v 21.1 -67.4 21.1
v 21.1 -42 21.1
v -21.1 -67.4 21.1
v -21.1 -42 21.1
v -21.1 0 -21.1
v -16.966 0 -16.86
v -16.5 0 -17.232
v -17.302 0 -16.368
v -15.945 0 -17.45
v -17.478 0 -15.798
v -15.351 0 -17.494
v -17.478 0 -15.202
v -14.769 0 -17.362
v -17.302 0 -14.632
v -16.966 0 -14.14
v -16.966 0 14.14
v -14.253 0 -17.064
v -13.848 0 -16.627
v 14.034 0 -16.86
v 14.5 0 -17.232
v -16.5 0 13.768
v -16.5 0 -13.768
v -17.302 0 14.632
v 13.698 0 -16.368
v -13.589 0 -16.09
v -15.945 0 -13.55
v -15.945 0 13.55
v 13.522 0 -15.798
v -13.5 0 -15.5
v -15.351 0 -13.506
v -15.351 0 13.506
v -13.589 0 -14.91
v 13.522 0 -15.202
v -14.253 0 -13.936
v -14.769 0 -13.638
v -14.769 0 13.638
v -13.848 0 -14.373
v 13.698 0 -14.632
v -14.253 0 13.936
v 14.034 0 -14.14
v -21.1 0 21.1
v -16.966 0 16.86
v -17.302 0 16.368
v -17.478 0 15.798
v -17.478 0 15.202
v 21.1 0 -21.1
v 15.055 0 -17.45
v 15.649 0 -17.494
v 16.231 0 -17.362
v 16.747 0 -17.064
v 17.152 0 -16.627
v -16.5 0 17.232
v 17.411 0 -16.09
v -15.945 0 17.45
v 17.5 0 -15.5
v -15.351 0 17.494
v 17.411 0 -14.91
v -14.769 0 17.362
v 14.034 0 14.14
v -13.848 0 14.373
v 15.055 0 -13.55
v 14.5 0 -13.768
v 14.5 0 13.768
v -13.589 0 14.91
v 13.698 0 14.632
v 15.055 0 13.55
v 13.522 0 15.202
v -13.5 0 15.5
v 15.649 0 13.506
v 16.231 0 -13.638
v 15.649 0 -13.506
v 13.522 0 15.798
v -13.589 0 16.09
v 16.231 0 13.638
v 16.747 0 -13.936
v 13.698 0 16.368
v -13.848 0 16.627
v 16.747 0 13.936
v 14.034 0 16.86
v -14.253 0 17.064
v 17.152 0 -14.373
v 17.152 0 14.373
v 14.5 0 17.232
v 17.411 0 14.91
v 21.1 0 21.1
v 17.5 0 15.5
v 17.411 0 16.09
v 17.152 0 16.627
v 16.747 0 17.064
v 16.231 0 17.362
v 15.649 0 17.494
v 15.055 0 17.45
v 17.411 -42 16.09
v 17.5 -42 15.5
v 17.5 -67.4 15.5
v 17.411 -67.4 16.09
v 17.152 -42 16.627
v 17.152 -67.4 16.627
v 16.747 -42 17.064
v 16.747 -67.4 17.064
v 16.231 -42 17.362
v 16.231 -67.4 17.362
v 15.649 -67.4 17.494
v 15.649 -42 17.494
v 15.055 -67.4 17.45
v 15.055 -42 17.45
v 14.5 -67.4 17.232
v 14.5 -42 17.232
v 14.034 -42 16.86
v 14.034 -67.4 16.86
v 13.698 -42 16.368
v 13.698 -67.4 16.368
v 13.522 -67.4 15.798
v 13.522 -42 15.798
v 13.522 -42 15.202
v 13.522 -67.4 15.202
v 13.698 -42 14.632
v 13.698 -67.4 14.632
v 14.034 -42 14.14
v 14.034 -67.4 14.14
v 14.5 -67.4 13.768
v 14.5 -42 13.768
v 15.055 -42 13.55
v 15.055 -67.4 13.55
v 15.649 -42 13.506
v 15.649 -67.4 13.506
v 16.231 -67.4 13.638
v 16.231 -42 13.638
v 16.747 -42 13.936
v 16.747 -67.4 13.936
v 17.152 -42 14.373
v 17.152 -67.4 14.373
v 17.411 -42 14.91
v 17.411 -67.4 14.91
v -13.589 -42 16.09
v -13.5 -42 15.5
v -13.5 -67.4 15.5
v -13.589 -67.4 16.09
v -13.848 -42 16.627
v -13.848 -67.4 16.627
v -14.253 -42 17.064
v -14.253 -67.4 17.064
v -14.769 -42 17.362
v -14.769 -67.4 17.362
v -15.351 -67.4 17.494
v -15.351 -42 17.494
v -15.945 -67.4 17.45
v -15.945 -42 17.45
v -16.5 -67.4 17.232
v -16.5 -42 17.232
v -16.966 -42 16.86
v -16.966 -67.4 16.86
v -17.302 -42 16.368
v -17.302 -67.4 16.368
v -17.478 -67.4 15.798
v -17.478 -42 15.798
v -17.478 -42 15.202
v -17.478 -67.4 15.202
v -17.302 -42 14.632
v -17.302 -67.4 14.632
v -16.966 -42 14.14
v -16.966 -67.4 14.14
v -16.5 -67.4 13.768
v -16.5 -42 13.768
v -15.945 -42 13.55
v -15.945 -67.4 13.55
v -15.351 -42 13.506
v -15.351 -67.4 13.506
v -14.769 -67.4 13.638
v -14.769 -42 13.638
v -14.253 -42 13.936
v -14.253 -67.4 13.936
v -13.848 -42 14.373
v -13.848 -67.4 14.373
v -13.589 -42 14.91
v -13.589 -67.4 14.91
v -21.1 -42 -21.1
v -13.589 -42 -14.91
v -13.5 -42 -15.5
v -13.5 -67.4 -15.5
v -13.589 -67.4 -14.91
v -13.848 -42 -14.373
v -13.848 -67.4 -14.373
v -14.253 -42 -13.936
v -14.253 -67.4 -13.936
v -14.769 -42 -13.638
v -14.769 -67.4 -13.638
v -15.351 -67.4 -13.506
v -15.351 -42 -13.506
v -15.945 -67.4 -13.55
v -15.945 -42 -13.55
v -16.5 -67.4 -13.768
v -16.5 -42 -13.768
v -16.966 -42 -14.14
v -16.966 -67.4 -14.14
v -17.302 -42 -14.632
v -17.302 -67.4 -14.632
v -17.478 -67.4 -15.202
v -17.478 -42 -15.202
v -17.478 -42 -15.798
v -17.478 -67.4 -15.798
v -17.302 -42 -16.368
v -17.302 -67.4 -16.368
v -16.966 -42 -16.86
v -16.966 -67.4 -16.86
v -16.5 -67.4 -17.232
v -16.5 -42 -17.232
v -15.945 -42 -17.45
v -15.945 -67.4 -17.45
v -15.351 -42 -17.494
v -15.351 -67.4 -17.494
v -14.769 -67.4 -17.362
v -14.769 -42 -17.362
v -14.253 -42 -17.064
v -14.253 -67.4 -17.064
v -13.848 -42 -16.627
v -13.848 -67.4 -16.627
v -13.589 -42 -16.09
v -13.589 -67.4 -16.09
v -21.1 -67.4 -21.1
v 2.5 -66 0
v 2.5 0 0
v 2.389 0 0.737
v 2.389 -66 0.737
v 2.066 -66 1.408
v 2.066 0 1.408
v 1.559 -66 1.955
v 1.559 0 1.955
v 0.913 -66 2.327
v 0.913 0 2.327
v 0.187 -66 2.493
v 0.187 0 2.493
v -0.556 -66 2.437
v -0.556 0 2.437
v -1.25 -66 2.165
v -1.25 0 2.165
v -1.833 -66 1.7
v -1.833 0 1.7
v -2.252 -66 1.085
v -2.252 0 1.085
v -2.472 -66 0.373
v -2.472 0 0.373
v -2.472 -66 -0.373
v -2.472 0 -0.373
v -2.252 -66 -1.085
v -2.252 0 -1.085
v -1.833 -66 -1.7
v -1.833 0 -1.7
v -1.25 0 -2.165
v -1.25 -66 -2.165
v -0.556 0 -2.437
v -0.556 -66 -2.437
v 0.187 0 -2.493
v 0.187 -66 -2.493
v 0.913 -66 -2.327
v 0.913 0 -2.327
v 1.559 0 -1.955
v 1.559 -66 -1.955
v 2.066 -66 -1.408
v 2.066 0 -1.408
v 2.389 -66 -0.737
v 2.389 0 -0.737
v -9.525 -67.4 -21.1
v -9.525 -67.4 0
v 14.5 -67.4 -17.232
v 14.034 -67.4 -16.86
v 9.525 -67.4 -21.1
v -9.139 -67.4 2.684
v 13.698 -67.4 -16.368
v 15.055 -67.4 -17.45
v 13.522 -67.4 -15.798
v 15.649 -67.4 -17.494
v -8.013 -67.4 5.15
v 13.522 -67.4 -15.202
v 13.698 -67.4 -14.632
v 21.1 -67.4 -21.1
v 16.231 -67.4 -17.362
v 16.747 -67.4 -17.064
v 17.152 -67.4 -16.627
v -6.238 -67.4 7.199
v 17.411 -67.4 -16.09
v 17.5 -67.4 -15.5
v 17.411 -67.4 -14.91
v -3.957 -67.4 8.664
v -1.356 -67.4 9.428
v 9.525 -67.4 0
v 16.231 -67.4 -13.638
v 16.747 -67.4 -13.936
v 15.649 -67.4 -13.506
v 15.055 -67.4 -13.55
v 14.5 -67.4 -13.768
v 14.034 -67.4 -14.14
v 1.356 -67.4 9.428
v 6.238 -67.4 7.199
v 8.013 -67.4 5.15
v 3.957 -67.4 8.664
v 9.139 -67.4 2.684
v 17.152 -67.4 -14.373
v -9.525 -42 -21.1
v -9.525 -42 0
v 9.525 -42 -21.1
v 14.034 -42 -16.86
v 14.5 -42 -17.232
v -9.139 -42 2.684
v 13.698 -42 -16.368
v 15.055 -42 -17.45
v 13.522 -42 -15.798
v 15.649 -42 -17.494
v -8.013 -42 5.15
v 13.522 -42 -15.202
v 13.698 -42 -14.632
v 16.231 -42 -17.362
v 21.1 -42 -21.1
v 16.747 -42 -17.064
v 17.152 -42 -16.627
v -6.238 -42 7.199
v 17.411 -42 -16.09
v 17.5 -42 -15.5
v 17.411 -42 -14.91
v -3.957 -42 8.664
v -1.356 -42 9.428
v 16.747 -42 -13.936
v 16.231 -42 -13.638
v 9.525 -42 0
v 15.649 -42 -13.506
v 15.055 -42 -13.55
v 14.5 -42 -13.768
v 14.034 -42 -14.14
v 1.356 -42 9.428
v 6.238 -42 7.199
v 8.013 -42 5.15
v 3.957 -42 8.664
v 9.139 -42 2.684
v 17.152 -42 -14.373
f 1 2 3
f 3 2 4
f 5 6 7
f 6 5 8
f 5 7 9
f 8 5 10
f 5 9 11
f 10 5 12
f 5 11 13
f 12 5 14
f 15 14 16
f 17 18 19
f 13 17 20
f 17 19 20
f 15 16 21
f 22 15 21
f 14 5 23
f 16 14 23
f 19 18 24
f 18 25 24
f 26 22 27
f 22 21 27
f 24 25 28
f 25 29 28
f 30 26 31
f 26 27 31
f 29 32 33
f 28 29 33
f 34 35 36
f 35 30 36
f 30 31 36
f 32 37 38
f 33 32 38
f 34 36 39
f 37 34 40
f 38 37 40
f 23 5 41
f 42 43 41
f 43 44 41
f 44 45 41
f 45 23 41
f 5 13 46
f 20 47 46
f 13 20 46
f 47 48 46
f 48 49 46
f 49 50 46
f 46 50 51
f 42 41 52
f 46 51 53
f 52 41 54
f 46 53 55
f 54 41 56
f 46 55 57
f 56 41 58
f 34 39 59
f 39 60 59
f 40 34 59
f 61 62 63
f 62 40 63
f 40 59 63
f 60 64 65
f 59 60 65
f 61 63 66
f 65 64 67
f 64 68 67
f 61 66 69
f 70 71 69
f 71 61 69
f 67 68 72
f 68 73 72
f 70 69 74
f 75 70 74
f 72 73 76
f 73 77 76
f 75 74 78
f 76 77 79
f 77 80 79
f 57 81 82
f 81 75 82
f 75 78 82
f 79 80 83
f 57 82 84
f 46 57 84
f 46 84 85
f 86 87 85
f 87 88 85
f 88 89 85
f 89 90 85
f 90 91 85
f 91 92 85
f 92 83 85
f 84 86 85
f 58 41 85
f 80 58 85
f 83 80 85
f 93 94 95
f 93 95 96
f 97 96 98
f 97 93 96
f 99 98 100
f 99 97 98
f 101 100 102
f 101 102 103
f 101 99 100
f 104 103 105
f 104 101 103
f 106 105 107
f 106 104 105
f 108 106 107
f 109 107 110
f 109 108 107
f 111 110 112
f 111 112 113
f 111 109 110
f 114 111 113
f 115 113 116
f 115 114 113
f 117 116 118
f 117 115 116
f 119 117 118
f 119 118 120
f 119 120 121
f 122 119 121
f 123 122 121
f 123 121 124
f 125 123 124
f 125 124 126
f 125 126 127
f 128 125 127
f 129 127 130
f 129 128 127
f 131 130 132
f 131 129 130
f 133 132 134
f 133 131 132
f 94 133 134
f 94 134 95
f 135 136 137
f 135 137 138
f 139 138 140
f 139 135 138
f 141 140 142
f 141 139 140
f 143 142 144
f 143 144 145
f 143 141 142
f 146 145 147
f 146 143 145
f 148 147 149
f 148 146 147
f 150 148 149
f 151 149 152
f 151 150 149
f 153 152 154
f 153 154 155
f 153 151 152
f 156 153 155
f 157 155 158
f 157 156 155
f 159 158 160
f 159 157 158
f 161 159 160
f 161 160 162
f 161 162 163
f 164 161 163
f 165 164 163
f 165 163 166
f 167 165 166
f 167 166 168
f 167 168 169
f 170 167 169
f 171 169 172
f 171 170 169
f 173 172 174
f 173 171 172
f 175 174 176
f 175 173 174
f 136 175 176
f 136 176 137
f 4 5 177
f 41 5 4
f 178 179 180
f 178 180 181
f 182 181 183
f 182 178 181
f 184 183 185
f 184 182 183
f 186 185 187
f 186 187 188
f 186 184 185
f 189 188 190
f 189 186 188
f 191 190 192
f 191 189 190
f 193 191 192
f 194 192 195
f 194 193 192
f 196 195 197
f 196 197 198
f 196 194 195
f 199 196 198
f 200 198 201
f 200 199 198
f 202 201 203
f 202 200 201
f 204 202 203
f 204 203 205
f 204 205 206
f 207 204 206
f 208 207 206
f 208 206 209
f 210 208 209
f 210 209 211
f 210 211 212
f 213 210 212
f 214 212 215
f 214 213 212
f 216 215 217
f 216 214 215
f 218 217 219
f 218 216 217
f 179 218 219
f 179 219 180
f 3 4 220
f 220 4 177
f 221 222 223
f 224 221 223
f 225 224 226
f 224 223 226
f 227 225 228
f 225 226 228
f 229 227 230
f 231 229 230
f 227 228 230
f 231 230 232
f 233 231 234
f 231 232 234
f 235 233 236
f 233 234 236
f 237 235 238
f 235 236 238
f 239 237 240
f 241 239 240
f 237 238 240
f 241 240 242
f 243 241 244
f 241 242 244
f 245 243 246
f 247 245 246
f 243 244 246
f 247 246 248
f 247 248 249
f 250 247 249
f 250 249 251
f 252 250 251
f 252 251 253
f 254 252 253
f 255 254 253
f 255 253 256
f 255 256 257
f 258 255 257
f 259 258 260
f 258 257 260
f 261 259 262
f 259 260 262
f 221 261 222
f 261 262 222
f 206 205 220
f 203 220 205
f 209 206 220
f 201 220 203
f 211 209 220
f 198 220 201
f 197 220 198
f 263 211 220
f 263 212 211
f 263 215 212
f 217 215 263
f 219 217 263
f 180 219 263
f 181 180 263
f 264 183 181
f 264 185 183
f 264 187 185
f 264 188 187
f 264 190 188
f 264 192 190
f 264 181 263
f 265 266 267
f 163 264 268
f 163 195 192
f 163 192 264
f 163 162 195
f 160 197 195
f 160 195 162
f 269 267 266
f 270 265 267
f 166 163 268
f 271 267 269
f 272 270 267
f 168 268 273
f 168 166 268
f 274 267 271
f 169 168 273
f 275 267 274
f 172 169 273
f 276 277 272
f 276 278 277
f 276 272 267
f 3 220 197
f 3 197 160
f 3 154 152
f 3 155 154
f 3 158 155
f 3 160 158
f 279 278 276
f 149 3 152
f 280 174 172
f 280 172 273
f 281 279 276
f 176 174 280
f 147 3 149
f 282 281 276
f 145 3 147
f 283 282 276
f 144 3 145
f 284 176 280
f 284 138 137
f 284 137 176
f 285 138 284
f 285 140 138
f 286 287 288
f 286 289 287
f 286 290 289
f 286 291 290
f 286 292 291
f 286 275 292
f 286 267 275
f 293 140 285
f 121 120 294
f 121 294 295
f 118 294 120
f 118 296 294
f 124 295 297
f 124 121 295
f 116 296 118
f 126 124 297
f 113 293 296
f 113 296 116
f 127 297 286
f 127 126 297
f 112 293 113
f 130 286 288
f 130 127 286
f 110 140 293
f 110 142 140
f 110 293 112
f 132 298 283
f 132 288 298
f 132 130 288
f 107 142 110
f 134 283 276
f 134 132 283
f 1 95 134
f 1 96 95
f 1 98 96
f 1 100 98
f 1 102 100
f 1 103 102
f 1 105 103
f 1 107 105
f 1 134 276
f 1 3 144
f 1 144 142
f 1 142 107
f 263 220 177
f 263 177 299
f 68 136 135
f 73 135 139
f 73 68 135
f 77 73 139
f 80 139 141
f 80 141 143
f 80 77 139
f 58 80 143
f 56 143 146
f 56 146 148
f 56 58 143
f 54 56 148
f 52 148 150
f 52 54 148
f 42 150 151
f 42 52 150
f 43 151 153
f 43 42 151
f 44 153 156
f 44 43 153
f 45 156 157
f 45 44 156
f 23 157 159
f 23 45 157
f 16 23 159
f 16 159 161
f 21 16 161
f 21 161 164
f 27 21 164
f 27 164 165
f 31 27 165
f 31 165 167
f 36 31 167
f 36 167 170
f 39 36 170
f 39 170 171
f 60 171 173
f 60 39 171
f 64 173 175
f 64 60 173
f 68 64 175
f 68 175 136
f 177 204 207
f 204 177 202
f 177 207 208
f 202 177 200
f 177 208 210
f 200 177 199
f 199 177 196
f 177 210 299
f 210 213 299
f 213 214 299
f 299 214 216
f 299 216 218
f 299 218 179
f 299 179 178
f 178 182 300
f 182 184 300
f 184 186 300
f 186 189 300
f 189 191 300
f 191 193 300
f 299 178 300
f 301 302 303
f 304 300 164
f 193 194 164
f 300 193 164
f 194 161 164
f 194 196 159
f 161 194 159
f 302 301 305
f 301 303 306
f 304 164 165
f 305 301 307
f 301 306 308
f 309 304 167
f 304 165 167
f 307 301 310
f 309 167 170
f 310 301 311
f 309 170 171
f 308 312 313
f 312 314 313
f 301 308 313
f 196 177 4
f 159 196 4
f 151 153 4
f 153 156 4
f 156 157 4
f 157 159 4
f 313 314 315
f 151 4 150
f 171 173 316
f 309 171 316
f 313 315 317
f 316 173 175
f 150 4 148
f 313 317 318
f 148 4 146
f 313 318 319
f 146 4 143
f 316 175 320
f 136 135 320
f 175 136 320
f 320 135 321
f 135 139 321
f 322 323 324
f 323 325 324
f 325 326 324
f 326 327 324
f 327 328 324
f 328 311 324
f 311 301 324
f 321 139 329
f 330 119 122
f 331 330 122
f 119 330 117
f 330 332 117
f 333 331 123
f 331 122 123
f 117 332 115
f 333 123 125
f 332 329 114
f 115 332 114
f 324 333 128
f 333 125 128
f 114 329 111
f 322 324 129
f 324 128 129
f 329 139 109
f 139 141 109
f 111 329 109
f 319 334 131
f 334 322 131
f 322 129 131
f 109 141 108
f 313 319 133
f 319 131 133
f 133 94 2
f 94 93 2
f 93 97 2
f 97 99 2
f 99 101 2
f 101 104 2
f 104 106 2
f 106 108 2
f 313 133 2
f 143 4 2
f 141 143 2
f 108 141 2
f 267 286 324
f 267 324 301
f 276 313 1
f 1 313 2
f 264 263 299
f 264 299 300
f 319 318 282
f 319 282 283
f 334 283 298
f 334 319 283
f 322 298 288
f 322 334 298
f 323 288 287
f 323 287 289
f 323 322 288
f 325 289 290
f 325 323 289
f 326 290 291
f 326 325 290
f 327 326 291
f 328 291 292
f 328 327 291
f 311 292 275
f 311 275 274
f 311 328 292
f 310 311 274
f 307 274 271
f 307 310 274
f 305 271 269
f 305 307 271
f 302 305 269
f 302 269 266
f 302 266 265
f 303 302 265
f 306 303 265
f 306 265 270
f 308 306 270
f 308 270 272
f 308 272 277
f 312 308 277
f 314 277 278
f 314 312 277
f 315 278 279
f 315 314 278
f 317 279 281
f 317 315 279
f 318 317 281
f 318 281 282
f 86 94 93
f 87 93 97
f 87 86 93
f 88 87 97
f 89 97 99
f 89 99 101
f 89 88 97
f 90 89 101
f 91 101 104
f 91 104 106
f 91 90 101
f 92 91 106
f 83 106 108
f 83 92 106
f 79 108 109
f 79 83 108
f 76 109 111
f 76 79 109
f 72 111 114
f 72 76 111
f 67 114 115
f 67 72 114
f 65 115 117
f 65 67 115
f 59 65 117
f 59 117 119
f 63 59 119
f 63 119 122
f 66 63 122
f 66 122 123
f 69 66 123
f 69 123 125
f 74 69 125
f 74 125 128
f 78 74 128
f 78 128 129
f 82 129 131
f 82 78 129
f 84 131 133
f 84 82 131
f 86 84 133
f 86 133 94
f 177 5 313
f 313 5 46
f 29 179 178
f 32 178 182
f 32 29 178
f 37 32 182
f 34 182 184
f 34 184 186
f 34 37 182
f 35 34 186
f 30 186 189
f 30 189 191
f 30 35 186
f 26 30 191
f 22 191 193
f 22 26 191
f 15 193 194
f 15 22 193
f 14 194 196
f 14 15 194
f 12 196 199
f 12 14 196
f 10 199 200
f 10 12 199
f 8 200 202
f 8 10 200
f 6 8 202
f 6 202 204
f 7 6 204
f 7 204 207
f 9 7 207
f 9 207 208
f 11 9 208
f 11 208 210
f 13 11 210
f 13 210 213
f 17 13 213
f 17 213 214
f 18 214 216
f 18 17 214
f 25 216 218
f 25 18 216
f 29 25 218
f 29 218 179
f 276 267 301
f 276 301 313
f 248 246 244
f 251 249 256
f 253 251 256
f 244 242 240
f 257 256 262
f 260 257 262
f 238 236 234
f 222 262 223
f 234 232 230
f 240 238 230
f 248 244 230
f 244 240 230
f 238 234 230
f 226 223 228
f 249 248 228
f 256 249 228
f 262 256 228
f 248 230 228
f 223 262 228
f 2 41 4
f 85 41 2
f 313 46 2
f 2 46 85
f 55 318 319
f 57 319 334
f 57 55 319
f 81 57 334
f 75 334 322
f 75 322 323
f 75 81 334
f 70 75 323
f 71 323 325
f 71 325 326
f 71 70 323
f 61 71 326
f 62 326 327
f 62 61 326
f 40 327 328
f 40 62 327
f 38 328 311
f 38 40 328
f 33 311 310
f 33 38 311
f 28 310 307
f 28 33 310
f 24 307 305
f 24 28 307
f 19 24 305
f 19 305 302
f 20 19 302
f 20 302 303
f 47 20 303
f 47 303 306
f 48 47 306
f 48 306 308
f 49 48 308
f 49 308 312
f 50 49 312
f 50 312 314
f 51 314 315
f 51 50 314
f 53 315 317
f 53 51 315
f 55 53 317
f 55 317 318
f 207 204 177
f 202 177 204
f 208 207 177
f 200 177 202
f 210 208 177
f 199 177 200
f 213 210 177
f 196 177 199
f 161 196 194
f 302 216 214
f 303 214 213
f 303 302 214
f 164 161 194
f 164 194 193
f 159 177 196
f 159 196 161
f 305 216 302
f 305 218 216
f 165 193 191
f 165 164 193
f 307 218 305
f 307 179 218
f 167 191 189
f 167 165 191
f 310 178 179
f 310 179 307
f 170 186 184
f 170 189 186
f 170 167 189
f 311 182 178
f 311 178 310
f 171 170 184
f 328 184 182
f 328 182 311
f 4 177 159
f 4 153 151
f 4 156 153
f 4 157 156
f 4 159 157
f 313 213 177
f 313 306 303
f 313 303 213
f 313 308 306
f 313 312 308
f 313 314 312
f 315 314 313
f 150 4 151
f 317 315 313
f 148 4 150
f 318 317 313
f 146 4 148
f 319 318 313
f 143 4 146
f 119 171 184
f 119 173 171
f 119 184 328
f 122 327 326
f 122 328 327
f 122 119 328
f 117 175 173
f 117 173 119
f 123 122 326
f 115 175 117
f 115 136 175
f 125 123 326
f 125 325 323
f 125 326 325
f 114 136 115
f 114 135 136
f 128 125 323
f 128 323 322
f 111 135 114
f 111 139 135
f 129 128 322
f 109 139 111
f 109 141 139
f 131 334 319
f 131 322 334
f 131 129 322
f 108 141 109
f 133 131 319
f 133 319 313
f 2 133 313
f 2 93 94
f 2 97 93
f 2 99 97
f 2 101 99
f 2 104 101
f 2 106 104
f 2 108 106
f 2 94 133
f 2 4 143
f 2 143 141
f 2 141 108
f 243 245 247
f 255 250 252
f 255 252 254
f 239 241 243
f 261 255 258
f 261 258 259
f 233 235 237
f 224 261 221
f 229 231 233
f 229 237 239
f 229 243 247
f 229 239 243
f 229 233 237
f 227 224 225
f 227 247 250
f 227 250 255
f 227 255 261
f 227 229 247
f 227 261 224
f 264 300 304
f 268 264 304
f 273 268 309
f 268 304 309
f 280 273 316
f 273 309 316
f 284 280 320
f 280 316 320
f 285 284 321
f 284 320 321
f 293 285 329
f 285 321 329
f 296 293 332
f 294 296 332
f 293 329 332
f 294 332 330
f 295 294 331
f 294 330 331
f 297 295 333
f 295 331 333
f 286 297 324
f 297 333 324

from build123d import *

# Parameters (mm, degrees)
F0_W     = 42.2
F0_H     = 42.2
F0_R     = 2
F0_R_2   = 2.5
F1_DEPTH = 42
F2_DEPTH = 66
F3_R     = 2
F4_DEPTH = 25.4


with BuildPart() as f1:
    # F0 (on Front) → F1 (new body)
    with BuildSketch(Plane.XZ):
        Rectangle(F0_W, F0_H)
        with Locations((-15.5, -15.5)):
            Circle(F0_R, mode=Mode.SUBTRACT)
        with Locations((15.5, -15.5)):
            Circle(F0_R, mode=Mode.SUBTRACT)
        with Locations((-15.5, 15.5)):
            Circle(F0_R, mode=Mode.SUBTRACT)
        Circle(F0_R_2, mode=Mode.SUBTRACT)
        with Locations((15.5, 15.5)):
            Circle(F0_R, mode=Mode.SUBTRACT)
        Circle(F0_R_2)
    extrude(amount=F1_DEPTH)


with BuildPart() as f2:
    # F0 (on Front) → F2 (new body)
    with BuildSketch(Plane.XZ):
        Circle(F0_R_2)
    extrude(amount=F2_DEPTH)


with BuildPart() as f4:
    # F3 (on face) → F4 (new body)
    with BuildSketch(Plane.XZ.offset(42)):
        with BuildLine():
            ThreePointArc((-9.525, 0), (0, 9.525), (9.525, 0))
            Line((9.525, 0), (9.525, -21.1))
            Line((9.525, -21.1), (21.1, -21.1))
            Line((21.1, -21.1), (21.1, 21.1))
            Line((21.1, 21.1), (-21.1, 21.1))
            Line((-21.1, 21.1), (-21.1, -21.1))
            Line((-21.1, -21.1), (-9.525, -21.1))
            Line((-9.525, -21.1), (-9.525, 0))
        make_face()
        with Locations((-15.5, -15.5)):
            Circle(F3_R, mode=Mode.SUBTRACT)
        with Locations((15.5, -15.5)):
            Circle(F3_R, mode=Mode.SUBTRACT)
        with Locations((-15.5, 15.5)):
            Circle(F3_R, mode=Mode.SUBTRACT)
        with Locations((15.5, 15.5)):
            Circle(F3_R, mode=Mode.SUBTRACT)
    extrude(amount=F4_DEPTH)


solid = Compound([f1.part, f2.part, f4.part])
